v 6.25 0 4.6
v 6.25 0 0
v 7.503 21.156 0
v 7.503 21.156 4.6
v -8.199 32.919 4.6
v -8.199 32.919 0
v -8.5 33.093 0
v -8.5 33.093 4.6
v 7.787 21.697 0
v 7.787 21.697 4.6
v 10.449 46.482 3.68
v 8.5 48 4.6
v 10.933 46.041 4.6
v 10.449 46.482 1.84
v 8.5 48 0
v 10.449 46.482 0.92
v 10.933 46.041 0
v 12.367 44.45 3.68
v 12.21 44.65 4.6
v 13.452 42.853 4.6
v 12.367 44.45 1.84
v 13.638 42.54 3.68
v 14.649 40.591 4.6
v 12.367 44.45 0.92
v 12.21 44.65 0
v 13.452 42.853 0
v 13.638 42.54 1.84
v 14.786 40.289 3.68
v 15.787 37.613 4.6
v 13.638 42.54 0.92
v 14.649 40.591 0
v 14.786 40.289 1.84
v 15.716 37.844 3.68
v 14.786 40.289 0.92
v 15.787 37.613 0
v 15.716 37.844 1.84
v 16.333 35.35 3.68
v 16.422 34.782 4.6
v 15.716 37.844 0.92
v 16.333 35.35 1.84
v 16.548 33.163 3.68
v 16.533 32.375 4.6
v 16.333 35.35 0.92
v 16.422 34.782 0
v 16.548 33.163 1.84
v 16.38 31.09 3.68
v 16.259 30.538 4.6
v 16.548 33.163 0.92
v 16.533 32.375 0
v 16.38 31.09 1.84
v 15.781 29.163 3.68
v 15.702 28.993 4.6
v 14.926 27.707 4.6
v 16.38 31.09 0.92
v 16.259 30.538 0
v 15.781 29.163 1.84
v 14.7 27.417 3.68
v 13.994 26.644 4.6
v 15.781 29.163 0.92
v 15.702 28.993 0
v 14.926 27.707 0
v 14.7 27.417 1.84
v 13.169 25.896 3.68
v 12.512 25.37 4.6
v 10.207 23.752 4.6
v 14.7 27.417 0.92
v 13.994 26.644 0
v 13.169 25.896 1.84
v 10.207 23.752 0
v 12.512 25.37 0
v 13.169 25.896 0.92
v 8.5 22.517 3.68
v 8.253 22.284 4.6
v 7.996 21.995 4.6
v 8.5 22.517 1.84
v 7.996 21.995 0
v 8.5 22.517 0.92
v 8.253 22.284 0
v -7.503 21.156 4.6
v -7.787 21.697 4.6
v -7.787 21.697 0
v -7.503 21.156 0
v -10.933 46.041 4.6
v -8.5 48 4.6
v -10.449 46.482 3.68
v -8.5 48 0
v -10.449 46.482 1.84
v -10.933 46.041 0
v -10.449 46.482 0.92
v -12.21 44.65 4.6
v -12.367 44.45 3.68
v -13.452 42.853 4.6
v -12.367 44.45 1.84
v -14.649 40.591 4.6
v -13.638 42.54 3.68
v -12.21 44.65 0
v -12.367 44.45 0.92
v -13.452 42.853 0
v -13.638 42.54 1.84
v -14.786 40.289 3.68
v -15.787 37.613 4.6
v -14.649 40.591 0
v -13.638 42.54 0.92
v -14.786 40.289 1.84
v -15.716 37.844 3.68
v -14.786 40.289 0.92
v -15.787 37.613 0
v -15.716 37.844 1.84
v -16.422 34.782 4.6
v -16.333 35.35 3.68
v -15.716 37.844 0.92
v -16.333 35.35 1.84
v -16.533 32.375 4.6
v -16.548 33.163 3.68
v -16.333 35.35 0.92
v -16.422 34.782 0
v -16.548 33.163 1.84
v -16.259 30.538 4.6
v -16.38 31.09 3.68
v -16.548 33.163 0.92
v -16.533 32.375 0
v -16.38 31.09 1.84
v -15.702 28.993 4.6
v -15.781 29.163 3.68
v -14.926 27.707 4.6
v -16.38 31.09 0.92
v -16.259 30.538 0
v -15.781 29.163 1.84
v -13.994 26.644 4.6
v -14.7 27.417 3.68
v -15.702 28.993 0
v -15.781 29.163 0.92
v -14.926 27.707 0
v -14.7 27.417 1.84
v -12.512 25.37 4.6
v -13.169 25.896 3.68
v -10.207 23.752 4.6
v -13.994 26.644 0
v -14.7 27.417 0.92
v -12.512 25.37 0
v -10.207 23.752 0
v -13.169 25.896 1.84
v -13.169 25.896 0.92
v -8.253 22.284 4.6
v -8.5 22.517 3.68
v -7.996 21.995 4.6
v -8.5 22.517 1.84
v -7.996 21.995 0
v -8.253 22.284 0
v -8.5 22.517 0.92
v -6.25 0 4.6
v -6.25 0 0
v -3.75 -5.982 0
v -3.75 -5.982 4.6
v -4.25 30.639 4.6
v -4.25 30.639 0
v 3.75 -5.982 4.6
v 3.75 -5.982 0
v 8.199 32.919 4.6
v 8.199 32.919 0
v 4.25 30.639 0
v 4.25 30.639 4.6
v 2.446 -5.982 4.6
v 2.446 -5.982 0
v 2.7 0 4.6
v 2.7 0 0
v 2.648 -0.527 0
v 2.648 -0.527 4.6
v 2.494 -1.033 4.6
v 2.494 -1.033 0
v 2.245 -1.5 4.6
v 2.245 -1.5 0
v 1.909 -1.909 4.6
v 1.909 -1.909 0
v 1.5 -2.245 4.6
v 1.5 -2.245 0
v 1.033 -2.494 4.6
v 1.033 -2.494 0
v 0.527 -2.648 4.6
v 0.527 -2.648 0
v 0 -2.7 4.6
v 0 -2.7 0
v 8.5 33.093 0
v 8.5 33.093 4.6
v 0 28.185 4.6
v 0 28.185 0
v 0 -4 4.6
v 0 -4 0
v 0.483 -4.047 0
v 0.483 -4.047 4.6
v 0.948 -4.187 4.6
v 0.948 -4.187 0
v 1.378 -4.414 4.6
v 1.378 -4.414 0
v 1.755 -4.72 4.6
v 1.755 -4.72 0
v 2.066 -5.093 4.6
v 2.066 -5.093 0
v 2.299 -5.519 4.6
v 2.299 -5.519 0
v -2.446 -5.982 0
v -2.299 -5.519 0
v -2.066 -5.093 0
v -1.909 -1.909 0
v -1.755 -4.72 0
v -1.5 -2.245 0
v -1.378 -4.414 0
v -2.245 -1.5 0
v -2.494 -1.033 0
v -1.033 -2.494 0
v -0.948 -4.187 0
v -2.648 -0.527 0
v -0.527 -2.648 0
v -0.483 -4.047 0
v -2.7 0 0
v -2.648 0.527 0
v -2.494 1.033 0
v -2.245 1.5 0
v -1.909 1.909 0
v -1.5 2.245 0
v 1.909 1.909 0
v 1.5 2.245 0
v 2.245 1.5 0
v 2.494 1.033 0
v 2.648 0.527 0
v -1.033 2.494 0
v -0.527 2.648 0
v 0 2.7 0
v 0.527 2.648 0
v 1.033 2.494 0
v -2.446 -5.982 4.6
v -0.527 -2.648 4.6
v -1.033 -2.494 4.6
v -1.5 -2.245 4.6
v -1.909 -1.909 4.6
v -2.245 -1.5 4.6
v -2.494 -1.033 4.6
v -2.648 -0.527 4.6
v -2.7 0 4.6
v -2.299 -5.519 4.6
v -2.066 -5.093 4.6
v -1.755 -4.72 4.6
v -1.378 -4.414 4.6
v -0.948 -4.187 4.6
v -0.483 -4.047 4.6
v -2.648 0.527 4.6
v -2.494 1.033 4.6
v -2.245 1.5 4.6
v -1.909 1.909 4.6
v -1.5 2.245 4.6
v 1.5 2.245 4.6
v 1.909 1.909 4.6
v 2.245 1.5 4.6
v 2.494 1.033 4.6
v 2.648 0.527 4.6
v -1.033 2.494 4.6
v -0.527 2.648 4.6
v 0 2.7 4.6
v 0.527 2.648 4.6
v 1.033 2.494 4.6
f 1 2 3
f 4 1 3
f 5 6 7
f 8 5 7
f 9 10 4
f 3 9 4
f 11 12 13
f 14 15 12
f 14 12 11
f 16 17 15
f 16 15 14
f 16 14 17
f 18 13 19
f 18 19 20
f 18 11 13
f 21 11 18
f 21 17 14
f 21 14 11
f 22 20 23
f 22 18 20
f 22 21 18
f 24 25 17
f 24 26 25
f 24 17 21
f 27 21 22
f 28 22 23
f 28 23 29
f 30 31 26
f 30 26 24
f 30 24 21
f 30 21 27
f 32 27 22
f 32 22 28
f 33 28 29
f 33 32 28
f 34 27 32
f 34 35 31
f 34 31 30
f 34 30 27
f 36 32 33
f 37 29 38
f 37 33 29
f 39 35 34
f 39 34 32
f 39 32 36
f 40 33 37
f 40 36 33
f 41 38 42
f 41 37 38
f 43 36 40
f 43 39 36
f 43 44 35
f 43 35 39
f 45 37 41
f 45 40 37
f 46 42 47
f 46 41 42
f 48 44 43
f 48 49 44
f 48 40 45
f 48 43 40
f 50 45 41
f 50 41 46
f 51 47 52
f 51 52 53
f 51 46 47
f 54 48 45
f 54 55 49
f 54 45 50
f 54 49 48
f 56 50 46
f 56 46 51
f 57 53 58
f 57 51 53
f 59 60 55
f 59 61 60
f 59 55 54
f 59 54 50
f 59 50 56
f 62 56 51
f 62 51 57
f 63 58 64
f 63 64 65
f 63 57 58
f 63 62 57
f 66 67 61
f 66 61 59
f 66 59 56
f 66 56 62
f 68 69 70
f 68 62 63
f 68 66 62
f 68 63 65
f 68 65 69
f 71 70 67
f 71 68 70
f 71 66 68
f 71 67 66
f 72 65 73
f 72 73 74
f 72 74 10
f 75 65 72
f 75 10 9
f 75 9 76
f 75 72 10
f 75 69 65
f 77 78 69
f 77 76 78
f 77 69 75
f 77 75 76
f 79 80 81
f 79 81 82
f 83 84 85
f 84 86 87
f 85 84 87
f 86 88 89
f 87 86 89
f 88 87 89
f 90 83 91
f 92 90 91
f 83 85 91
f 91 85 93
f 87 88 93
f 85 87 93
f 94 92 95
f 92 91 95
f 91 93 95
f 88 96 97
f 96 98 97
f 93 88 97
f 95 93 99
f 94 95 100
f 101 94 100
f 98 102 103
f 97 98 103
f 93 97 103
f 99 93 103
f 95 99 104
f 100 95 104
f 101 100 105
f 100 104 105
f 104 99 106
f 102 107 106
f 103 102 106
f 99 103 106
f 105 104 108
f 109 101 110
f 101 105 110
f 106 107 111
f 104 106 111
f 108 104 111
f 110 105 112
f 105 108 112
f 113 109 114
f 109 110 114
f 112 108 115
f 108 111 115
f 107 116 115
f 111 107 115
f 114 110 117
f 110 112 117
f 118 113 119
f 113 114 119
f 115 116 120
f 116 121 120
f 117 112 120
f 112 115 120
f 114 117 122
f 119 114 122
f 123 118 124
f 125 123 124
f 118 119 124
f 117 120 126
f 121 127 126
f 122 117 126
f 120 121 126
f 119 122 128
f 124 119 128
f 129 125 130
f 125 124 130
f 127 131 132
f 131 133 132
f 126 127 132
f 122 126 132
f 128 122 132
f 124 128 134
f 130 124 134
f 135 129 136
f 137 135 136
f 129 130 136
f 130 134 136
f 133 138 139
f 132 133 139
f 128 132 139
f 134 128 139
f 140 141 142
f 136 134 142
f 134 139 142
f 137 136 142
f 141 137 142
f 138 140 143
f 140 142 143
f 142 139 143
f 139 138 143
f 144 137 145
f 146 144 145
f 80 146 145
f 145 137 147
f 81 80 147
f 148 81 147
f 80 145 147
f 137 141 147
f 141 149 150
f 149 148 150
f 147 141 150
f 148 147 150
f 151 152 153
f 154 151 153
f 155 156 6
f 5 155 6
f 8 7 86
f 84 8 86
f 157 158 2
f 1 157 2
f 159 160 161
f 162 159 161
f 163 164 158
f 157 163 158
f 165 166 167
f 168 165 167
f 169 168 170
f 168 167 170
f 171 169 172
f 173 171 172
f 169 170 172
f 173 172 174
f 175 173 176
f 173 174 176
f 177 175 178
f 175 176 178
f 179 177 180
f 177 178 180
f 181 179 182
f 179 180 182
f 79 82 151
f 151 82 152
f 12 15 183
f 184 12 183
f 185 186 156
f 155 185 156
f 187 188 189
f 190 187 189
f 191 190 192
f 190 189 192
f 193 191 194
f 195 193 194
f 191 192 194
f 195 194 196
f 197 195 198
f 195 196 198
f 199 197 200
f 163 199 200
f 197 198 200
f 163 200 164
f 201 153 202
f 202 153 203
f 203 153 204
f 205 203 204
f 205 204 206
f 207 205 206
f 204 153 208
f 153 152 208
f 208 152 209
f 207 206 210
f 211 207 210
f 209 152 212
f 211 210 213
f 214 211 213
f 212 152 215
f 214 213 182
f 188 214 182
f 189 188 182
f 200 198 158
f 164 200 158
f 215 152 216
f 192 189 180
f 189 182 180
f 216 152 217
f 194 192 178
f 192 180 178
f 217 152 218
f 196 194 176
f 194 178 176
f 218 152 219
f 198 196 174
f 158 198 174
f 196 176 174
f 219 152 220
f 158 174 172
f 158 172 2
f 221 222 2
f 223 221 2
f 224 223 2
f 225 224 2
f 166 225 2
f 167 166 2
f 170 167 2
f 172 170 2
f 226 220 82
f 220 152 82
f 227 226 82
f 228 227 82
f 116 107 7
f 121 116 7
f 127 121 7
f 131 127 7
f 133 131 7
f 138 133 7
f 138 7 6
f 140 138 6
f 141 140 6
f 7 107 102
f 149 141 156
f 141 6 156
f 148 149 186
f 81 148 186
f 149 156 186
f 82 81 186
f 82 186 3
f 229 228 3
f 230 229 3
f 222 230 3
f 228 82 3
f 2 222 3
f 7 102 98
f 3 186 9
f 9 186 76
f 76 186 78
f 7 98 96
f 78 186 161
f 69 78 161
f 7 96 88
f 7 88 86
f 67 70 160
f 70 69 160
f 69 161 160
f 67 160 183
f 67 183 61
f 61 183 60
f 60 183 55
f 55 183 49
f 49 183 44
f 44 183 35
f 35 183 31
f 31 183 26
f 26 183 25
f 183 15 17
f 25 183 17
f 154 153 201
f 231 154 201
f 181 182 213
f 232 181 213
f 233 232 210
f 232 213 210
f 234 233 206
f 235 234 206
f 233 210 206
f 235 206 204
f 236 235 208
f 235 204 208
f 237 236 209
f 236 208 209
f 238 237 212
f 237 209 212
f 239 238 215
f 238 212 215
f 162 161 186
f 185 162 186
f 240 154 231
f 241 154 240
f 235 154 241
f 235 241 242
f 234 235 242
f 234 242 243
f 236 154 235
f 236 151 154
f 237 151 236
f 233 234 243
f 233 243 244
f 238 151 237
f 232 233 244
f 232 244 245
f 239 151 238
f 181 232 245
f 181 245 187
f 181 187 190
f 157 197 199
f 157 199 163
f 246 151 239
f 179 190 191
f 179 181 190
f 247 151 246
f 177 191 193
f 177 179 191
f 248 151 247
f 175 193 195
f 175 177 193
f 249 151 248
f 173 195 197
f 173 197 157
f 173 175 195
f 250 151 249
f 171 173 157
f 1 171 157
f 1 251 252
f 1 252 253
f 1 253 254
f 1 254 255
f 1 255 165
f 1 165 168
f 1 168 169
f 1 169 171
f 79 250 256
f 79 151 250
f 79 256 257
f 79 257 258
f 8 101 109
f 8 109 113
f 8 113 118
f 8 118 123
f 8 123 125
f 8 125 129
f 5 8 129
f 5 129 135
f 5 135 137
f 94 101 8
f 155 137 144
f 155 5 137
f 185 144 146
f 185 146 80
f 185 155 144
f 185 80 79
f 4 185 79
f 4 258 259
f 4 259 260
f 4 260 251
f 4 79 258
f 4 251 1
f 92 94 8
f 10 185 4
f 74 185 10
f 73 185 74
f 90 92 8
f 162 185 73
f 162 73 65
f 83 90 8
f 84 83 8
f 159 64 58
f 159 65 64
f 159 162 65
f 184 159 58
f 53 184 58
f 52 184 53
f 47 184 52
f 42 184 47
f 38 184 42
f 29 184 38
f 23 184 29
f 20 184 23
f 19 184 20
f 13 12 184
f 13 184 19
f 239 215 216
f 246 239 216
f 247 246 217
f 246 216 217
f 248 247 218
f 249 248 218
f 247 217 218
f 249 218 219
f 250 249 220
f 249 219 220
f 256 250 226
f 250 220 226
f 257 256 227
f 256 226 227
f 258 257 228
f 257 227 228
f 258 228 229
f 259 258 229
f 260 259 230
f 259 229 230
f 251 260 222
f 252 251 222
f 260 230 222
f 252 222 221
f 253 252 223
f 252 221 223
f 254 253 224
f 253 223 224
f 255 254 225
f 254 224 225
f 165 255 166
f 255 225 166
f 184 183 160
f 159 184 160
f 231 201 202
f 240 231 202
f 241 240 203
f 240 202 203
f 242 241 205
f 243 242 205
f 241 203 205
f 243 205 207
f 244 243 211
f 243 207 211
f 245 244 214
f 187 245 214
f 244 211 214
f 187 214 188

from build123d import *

# Parameters (mm, degrees)
F1_DEPTH = 4.6


with BuildPart() as f1:
    # F0 (on Top) → F1 (new body)
    with BuildSketch(Plane.XY):
        with BuildLine():
            add(Edge.make_bspline(
                [(-8.5, 48), (-9.8024770987, 47.0450035283), (-12.8961101174, 44.7767036705), (-17.2574412974, 35.4365031151), (-16.1224085544, 26.8770846678), (-8.337300297, 22.9033200888), (-7.7030849608, 21.5755830002), (-7.5026569915, 21.1559847449)],
                knots=[0, 0, 0, 0, 0.1847988509, 0.4389327287, 0.6684893369, 0.8952343073, 1, 1, 1, 1], degree=3))
            Line((-7.5026569915, 21.1559847449), (-8.1991407492, 32.9188215425))
            Line((-8.1991407492, 32.9188215425), (-8.5, 33.0925227119))
            Line((-8.5, 33.0925227119), (-8.5, 38))
            Line((-8.5, 38), (-8.5, 42.9074772881))
            Line((-8.5, 42.9074772881), (-8.5, 48))
        make_face()
        with BuildLine():
            Line((8.1991407492, 32.9188215425), (7.5026569915, 21.1559847449))
            add(Edge.make_bspline(
                [(8.5, 48), (9.8024770987, 47.0450035283), (12.8961101174, 44.7767036705), (17.2574412974, 35.4365031151), (16.1224085544, 26.8770846678), (8.337300297, 22.9033200888), (7.7030849608, 21.5755830002), (7.5026569915, 21.1559847449)],
                knots=[0, 0, 0, 0, 0.1847988509, 0.4389327287, 0.6684893369, 0.8952343073, 1, 1, 1, 1], degree=3))
            Line((8.5, 48), (8.5, 42.9074772881))
            Line((8.5, 42.9074772881), (8.5, 38))
            Line((8.5, 38), (8.5, 33.0925227119))
            Line((8.5, 33.0925227119), (8.1991407492, 32.9188215425))
        make_face()
        with BuildLine():
            ThreePointArc((0, 2.7), (1.9091883092, 1.9091883092), (2.7, 0))
            Line((2.7, 0), (6.25, 0))
            Line((6.25, 0), (7.5026569915, 21.1559847449))
            Line((7.5026569915, 21.1559847449), (8.1991407492, 32.9188215425))
            Line((8.1991407492, 32.9188215425), (4.249999944, 30.6387840355))
            Line((4.249999944, 30.6387840355), (0, 28.1850454238))
            Line((0, 28.1850454238), (0, 2.7))
        make_face()
        with BuildLine():
            ThreePointArc((-2.7, 0), (-1.9091883092, 1.9091883092), (0, 2.7))
            Line((0, 2.7), (0, 28.1850454238))
            Line((0, 28.1850454238), (-4.2500000293, 30.6387840847))
            Line((-4.2500000293, 30.6387840847), (-8.1991407492, 32.9188215425))
            Line((-8.1991407492, 32.9188215425), (-7.5026569915, 21.1559847449))
            Line((-7.5026569915, 21.1559847449), (-6.25, 0))
            Line((-6.25, 0), (-2.7, 0))
        make_face()
        with BuildLine():
            Line((6.25, 0), (2.7, 0))
            ThreePointArc((2.7, 0), (1.9091883092, -1.9091883092), (0, -2.7))
            Line((0, -2.7), (0, -4))
            ThreePointArc((0, -4), (1.5738350665, -4.5575677145), (2.4456544361, -5.9815654531))
            Line((2.4456544361, -5.9815654531), (2.5, -5.9815654531))
            Line((2.5, -5.9815654531), (3.75, -5.9815654531))
            Line((3.75, -5.9815654531), (6.25, 0))
        make_face()
        with BuildLine():
            Line((0, -4), (0, -2.7))
            ThreePointArc((0, -2.7), (-1.9091883092, -1.9091883092), (-2.7, 0))
            Line((-2.7, 0), (-6.25, 0))
            Line((-6.25, 0), (-3.75, -5.9815654531))
            Line((-3.75, -5.9815654531), (-2.5, -5.9815654531))
            Line((-2.5, -5.9815654531), (-2.4456544361, -5.9815654531))
            ThreePointArc((-2.4456544361, -5.9815654531), (-1.5738350665, -4.5575677145), (0, -4))
        make_face()
    extrude(amount=F1_DEPTH)


solid = f1.part
